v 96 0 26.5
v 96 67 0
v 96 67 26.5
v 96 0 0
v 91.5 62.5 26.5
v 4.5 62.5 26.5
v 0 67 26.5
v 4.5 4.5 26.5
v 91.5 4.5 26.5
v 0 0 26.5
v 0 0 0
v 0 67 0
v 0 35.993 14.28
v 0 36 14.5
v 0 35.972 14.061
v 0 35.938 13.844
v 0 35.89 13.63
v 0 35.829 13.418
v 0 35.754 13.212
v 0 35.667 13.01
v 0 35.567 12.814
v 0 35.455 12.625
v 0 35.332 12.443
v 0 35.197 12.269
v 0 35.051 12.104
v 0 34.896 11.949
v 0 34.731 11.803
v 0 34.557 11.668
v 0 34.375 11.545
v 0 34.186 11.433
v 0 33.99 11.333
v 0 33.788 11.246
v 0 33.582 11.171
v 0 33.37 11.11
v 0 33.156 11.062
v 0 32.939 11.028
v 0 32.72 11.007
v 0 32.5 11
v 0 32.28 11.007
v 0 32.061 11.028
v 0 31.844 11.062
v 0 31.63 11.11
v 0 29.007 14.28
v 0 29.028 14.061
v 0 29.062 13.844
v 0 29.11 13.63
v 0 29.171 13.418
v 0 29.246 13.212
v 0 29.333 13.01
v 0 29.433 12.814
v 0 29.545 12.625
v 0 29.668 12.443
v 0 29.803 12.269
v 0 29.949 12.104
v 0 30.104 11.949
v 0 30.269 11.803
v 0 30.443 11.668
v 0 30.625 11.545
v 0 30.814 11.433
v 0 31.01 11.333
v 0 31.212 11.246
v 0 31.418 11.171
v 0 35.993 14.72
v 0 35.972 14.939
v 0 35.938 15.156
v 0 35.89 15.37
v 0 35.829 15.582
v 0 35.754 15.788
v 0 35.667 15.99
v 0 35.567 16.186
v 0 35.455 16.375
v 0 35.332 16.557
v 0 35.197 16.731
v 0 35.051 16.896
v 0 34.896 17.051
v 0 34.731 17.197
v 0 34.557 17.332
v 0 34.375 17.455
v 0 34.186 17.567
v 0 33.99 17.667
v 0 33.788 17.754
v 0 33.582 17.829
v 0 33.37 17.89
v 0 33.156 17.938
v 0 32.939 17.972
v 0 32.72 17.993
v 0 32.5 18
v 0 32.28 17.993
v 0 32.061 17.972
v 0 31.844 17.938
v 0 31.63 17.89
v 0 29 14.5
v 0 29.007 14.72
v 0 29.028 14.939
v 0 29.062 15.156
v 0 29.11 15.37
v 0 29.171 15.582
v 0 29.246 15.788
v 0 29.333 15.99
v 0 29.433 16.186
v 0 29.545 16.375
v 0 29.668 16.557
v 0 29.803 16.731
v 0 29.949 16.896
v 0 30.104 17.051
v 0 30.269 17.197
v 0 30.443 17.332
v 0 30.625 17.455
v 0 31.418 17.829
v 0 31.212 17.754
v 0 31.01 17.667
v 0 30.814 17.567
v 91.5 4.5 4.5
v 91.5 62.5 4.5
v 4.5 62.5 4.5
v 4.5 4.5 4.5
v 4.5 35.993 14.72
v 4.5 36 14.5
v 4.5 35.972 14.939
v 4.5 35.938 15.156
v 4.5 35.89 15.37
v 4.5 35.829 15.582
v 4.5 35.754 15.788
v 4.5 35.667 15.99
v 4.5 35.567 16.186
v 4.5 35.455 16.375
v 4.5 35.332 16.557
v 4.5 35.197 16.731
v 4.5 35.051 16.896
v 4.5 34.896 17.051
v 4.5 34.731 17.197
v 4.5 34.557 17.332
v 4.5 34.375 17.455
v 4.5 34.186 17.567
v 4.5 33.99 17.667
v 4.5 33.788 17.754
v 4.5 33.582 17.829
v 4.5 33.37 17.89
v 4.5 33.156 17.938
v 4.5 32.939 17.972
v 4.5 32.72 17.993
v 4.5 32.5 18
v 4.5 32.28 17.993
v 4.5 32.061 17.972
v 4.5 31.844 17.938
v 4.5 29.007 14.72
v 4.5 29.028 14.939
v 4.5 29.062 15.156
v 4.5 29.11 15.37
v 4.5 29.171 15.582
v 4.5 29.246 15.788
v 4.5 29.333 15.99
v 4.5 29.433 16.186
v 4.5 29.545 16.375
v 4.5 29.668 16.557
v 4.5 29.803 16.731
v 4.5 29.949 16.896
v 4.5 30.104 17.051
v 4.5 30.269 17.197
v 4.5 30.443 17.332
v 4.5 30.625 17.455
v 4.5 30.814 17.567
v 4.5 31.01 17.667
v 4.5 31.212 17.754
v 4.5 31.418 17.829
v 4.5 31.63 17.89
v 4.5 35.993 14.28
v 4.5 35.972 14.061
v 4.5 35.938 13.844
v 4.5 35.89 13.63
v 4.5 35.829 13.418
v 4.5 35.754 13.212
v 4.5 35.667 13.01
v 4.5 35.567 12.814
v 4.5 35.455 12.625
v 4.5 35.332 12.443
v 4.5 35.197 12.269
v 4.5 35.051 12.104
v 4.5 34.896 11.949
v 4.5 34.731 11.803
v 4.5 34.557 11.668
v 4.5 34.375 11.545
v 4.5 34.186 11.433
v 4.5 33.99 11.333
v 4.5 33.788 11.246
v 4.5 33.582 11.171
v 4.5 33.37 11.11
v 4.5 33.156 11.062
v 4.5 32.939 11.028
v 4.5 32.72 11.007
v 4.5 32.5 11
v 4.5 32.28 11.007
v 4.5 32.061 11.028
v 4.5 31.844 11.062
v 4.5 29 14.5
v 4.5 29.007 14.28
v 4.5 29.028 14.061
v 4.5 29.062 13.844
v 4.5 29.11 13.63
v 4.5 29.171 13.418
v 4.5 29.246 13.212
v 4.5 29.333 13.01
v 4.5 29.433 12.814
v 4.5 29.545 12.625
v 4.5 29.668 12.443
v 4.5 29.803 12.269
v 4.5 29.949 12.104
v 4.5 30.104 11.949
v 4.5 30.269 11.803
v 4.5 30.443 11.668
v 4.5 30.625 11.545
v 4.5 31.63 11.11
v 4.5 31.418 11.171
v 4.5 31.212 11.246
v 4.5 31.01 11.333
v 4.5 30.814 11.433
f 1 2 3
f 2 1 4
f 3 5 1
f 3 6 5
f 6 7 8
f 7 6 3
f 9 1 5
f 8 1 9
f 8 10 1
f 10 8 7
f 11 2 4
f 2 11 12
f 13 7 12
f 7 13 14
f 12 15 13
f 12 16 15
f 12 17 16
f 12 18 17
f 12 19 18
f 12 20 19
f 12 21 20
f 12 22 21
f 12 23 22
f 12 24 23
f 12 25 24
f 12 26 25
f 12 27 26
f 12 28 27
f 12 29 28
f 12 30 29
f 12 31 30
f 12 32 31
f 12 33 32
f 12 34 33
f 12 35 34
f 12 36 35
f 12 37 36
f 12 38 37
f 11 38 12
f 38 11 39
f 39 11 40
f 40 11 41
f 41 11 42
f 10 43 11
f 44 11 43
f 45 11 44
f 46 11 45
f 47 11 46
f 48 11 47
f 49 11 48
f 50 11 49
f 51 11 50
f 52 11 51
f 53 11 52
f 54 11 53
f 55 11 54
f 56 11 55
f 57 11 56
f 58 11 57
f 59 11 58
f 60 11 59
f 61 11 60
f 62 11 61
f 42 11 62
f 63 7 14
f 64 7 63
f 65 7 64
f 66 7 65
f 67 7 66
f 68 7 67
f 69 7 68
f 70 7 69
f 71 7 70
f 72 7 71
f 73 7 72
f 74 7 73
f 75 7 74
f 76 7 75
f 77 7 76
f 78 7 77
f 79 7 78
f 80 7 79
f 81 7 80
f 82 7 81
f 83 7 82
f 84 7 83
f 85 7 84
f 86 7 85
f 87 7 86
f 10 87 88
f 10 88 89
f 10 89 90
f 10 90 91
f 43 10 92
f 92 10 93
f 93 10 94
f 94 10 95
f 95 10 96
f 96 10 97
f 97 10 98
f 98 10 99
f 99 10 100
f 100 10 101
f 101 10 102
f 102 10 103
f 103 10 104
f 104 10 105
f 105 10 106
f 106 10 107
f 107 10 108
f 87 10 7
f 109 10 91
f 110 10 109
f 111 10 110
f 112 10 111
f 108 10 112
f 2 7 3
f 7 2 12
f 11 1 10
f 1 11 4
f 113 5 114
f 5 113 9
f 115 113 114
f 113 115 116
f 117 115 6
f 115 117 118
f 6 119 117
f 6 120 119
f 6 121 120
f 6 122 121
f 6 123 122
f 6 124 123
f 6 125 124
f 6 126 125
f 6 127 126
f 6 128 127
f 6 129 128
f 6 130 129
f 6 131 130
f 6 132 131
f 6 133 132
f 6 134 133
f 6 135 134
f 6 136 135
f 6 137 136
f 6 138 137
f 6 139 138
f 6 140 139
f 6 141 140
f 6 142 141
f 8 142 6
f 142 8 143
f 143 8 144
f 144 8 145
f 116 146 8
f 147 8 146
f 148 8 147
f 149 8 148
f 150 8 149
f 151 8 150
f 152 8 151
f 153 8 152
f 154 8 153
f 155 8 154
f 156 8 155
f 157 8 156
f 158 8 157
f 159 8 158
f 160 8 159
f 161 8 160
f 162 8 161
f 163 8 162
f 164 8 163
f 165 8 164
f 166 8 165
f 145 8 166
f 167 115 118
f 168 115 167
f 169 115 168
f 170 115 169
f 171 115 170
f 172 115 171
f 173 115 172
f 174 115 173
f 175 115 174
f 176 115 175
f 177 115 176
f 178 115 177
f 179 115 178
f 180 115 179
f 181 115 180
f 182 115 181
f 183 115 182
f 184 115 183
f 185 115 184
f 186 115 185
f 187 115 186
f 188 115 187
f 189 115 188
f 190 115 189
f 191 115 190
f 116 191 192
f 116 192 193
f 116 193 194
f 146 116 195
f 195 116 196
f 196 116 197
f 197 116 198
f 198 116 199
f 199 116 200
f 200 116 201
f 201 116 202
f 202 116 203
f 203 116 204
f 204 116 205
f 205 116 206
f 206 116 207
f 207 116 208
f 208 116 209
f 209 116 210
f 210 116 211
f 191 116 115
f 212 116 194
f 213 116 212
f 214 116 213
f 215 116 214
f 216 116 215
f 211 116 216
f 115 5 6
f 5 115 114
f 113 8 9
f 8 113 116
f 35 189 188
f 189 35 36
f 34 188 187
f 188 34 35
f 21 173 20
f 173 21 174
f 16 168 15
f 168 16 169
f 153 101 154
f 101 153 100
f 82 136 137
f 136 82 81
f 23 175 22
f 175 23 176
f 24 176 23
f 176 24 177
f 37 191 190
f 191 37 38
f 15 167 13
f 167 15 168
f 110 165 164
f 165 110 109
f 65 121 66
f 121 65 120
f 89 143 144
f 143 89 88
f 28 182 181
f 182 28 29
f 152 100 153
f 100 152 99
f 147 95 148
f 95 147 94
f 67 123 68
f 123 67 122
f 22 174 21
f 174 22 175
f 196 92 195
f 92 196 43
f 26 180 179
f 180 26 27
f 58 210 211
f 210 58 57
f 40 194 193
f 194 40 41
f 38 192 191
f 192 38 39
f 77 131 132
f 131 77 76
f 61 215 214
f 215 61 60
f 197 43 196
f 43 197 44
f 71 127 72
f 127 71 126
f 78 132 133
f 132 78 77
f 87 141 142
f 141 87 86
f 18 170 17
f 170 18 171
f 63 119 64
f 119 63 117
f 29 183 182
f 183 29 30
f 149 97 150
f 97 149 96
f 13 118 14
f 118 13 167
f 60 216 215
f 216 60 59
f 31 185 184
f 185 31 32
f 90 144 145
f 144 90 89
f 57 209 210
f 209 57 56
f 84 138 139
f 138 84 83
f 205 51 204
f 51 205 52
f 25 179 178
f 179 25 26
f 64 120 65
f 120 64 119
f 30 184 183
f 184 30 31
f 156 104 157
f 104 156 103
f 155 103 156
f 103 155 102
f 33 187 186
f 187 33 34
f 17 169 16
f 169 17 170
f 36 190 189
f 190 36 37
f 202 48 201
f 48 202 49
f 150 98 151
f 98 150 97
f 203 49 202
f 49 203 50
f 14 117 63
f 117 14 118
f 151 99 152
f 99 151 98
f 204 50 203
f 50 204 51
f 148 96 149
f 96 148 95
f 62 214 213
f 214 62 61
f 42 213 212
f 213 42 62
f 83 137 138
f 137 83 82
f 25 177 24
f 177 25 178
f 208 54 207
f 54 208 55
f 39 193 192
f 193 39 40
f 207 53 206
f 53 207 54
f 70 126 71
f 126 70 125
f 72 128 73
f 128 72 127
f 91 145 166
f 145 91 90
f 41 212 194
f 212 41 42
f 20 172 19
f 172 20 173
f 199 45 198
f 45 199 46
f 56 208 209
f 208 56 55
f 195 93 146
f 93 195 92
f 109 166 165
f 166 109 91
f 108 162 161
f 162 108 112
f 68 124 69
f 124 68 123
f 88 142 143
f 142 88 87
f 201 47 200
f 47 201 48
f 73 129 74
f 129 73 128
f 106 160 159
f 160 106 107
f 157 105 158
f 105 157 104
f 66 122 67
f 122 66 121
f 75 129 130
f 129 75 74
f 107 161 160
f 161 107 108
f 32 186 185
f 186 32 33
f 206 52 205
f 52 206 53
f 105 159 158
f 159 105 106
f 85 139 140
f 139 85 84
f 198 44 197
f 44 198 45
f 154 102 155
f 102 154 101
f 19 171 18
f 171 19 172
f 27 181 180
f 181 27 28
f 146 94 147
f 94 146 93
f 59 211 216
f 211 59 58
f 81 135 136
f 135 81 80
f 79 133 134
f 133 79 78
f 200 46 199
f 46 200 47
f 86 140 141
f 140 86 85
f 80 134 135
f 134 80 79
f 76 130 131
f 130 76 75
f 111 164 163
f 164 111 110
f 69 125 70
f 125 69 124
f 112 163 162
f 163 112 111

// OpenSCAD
// MIL-SPEC Anchor Node Casing for Cat_Dark Enterprise
// Parametric OpenSCAD Design for 3D Printing (Ruggedized, IP67 compliant logic)

$fn = 100;
wall_thickness = 4.5; // Heavy duty walls
board_width = 85.0; // Raspberry Pi / Orange Pi size
board_length = 56.0;
board_height = 20.0;
clearance = 2.0;

module base_case() {
    difference() {
        // Outer Shell
        cube([board_width + (wall_thickness*2) + clearance, 
              board_length + (wall_thickness*2) + clearance, 
              board_height + wall_thickness + clearance]);
              
        // Inner Cavity
        translate([wall_thickness, wall_thickness, wall_thickness])
        cube([board_width + clearance, 
              board_length + clearance, 
              board_height + clearance + 1]);
              
        // Antenna Ports (SMA Connectors)
        translate([-1, board_length/2 + wall_thickness, board_height/2 + wall_thickness])
        rotate([0, 90, 0])
        cylinder(h=wall_thickness+2, r=3.5);
    }
}

// Render the rugged case
base_case();
